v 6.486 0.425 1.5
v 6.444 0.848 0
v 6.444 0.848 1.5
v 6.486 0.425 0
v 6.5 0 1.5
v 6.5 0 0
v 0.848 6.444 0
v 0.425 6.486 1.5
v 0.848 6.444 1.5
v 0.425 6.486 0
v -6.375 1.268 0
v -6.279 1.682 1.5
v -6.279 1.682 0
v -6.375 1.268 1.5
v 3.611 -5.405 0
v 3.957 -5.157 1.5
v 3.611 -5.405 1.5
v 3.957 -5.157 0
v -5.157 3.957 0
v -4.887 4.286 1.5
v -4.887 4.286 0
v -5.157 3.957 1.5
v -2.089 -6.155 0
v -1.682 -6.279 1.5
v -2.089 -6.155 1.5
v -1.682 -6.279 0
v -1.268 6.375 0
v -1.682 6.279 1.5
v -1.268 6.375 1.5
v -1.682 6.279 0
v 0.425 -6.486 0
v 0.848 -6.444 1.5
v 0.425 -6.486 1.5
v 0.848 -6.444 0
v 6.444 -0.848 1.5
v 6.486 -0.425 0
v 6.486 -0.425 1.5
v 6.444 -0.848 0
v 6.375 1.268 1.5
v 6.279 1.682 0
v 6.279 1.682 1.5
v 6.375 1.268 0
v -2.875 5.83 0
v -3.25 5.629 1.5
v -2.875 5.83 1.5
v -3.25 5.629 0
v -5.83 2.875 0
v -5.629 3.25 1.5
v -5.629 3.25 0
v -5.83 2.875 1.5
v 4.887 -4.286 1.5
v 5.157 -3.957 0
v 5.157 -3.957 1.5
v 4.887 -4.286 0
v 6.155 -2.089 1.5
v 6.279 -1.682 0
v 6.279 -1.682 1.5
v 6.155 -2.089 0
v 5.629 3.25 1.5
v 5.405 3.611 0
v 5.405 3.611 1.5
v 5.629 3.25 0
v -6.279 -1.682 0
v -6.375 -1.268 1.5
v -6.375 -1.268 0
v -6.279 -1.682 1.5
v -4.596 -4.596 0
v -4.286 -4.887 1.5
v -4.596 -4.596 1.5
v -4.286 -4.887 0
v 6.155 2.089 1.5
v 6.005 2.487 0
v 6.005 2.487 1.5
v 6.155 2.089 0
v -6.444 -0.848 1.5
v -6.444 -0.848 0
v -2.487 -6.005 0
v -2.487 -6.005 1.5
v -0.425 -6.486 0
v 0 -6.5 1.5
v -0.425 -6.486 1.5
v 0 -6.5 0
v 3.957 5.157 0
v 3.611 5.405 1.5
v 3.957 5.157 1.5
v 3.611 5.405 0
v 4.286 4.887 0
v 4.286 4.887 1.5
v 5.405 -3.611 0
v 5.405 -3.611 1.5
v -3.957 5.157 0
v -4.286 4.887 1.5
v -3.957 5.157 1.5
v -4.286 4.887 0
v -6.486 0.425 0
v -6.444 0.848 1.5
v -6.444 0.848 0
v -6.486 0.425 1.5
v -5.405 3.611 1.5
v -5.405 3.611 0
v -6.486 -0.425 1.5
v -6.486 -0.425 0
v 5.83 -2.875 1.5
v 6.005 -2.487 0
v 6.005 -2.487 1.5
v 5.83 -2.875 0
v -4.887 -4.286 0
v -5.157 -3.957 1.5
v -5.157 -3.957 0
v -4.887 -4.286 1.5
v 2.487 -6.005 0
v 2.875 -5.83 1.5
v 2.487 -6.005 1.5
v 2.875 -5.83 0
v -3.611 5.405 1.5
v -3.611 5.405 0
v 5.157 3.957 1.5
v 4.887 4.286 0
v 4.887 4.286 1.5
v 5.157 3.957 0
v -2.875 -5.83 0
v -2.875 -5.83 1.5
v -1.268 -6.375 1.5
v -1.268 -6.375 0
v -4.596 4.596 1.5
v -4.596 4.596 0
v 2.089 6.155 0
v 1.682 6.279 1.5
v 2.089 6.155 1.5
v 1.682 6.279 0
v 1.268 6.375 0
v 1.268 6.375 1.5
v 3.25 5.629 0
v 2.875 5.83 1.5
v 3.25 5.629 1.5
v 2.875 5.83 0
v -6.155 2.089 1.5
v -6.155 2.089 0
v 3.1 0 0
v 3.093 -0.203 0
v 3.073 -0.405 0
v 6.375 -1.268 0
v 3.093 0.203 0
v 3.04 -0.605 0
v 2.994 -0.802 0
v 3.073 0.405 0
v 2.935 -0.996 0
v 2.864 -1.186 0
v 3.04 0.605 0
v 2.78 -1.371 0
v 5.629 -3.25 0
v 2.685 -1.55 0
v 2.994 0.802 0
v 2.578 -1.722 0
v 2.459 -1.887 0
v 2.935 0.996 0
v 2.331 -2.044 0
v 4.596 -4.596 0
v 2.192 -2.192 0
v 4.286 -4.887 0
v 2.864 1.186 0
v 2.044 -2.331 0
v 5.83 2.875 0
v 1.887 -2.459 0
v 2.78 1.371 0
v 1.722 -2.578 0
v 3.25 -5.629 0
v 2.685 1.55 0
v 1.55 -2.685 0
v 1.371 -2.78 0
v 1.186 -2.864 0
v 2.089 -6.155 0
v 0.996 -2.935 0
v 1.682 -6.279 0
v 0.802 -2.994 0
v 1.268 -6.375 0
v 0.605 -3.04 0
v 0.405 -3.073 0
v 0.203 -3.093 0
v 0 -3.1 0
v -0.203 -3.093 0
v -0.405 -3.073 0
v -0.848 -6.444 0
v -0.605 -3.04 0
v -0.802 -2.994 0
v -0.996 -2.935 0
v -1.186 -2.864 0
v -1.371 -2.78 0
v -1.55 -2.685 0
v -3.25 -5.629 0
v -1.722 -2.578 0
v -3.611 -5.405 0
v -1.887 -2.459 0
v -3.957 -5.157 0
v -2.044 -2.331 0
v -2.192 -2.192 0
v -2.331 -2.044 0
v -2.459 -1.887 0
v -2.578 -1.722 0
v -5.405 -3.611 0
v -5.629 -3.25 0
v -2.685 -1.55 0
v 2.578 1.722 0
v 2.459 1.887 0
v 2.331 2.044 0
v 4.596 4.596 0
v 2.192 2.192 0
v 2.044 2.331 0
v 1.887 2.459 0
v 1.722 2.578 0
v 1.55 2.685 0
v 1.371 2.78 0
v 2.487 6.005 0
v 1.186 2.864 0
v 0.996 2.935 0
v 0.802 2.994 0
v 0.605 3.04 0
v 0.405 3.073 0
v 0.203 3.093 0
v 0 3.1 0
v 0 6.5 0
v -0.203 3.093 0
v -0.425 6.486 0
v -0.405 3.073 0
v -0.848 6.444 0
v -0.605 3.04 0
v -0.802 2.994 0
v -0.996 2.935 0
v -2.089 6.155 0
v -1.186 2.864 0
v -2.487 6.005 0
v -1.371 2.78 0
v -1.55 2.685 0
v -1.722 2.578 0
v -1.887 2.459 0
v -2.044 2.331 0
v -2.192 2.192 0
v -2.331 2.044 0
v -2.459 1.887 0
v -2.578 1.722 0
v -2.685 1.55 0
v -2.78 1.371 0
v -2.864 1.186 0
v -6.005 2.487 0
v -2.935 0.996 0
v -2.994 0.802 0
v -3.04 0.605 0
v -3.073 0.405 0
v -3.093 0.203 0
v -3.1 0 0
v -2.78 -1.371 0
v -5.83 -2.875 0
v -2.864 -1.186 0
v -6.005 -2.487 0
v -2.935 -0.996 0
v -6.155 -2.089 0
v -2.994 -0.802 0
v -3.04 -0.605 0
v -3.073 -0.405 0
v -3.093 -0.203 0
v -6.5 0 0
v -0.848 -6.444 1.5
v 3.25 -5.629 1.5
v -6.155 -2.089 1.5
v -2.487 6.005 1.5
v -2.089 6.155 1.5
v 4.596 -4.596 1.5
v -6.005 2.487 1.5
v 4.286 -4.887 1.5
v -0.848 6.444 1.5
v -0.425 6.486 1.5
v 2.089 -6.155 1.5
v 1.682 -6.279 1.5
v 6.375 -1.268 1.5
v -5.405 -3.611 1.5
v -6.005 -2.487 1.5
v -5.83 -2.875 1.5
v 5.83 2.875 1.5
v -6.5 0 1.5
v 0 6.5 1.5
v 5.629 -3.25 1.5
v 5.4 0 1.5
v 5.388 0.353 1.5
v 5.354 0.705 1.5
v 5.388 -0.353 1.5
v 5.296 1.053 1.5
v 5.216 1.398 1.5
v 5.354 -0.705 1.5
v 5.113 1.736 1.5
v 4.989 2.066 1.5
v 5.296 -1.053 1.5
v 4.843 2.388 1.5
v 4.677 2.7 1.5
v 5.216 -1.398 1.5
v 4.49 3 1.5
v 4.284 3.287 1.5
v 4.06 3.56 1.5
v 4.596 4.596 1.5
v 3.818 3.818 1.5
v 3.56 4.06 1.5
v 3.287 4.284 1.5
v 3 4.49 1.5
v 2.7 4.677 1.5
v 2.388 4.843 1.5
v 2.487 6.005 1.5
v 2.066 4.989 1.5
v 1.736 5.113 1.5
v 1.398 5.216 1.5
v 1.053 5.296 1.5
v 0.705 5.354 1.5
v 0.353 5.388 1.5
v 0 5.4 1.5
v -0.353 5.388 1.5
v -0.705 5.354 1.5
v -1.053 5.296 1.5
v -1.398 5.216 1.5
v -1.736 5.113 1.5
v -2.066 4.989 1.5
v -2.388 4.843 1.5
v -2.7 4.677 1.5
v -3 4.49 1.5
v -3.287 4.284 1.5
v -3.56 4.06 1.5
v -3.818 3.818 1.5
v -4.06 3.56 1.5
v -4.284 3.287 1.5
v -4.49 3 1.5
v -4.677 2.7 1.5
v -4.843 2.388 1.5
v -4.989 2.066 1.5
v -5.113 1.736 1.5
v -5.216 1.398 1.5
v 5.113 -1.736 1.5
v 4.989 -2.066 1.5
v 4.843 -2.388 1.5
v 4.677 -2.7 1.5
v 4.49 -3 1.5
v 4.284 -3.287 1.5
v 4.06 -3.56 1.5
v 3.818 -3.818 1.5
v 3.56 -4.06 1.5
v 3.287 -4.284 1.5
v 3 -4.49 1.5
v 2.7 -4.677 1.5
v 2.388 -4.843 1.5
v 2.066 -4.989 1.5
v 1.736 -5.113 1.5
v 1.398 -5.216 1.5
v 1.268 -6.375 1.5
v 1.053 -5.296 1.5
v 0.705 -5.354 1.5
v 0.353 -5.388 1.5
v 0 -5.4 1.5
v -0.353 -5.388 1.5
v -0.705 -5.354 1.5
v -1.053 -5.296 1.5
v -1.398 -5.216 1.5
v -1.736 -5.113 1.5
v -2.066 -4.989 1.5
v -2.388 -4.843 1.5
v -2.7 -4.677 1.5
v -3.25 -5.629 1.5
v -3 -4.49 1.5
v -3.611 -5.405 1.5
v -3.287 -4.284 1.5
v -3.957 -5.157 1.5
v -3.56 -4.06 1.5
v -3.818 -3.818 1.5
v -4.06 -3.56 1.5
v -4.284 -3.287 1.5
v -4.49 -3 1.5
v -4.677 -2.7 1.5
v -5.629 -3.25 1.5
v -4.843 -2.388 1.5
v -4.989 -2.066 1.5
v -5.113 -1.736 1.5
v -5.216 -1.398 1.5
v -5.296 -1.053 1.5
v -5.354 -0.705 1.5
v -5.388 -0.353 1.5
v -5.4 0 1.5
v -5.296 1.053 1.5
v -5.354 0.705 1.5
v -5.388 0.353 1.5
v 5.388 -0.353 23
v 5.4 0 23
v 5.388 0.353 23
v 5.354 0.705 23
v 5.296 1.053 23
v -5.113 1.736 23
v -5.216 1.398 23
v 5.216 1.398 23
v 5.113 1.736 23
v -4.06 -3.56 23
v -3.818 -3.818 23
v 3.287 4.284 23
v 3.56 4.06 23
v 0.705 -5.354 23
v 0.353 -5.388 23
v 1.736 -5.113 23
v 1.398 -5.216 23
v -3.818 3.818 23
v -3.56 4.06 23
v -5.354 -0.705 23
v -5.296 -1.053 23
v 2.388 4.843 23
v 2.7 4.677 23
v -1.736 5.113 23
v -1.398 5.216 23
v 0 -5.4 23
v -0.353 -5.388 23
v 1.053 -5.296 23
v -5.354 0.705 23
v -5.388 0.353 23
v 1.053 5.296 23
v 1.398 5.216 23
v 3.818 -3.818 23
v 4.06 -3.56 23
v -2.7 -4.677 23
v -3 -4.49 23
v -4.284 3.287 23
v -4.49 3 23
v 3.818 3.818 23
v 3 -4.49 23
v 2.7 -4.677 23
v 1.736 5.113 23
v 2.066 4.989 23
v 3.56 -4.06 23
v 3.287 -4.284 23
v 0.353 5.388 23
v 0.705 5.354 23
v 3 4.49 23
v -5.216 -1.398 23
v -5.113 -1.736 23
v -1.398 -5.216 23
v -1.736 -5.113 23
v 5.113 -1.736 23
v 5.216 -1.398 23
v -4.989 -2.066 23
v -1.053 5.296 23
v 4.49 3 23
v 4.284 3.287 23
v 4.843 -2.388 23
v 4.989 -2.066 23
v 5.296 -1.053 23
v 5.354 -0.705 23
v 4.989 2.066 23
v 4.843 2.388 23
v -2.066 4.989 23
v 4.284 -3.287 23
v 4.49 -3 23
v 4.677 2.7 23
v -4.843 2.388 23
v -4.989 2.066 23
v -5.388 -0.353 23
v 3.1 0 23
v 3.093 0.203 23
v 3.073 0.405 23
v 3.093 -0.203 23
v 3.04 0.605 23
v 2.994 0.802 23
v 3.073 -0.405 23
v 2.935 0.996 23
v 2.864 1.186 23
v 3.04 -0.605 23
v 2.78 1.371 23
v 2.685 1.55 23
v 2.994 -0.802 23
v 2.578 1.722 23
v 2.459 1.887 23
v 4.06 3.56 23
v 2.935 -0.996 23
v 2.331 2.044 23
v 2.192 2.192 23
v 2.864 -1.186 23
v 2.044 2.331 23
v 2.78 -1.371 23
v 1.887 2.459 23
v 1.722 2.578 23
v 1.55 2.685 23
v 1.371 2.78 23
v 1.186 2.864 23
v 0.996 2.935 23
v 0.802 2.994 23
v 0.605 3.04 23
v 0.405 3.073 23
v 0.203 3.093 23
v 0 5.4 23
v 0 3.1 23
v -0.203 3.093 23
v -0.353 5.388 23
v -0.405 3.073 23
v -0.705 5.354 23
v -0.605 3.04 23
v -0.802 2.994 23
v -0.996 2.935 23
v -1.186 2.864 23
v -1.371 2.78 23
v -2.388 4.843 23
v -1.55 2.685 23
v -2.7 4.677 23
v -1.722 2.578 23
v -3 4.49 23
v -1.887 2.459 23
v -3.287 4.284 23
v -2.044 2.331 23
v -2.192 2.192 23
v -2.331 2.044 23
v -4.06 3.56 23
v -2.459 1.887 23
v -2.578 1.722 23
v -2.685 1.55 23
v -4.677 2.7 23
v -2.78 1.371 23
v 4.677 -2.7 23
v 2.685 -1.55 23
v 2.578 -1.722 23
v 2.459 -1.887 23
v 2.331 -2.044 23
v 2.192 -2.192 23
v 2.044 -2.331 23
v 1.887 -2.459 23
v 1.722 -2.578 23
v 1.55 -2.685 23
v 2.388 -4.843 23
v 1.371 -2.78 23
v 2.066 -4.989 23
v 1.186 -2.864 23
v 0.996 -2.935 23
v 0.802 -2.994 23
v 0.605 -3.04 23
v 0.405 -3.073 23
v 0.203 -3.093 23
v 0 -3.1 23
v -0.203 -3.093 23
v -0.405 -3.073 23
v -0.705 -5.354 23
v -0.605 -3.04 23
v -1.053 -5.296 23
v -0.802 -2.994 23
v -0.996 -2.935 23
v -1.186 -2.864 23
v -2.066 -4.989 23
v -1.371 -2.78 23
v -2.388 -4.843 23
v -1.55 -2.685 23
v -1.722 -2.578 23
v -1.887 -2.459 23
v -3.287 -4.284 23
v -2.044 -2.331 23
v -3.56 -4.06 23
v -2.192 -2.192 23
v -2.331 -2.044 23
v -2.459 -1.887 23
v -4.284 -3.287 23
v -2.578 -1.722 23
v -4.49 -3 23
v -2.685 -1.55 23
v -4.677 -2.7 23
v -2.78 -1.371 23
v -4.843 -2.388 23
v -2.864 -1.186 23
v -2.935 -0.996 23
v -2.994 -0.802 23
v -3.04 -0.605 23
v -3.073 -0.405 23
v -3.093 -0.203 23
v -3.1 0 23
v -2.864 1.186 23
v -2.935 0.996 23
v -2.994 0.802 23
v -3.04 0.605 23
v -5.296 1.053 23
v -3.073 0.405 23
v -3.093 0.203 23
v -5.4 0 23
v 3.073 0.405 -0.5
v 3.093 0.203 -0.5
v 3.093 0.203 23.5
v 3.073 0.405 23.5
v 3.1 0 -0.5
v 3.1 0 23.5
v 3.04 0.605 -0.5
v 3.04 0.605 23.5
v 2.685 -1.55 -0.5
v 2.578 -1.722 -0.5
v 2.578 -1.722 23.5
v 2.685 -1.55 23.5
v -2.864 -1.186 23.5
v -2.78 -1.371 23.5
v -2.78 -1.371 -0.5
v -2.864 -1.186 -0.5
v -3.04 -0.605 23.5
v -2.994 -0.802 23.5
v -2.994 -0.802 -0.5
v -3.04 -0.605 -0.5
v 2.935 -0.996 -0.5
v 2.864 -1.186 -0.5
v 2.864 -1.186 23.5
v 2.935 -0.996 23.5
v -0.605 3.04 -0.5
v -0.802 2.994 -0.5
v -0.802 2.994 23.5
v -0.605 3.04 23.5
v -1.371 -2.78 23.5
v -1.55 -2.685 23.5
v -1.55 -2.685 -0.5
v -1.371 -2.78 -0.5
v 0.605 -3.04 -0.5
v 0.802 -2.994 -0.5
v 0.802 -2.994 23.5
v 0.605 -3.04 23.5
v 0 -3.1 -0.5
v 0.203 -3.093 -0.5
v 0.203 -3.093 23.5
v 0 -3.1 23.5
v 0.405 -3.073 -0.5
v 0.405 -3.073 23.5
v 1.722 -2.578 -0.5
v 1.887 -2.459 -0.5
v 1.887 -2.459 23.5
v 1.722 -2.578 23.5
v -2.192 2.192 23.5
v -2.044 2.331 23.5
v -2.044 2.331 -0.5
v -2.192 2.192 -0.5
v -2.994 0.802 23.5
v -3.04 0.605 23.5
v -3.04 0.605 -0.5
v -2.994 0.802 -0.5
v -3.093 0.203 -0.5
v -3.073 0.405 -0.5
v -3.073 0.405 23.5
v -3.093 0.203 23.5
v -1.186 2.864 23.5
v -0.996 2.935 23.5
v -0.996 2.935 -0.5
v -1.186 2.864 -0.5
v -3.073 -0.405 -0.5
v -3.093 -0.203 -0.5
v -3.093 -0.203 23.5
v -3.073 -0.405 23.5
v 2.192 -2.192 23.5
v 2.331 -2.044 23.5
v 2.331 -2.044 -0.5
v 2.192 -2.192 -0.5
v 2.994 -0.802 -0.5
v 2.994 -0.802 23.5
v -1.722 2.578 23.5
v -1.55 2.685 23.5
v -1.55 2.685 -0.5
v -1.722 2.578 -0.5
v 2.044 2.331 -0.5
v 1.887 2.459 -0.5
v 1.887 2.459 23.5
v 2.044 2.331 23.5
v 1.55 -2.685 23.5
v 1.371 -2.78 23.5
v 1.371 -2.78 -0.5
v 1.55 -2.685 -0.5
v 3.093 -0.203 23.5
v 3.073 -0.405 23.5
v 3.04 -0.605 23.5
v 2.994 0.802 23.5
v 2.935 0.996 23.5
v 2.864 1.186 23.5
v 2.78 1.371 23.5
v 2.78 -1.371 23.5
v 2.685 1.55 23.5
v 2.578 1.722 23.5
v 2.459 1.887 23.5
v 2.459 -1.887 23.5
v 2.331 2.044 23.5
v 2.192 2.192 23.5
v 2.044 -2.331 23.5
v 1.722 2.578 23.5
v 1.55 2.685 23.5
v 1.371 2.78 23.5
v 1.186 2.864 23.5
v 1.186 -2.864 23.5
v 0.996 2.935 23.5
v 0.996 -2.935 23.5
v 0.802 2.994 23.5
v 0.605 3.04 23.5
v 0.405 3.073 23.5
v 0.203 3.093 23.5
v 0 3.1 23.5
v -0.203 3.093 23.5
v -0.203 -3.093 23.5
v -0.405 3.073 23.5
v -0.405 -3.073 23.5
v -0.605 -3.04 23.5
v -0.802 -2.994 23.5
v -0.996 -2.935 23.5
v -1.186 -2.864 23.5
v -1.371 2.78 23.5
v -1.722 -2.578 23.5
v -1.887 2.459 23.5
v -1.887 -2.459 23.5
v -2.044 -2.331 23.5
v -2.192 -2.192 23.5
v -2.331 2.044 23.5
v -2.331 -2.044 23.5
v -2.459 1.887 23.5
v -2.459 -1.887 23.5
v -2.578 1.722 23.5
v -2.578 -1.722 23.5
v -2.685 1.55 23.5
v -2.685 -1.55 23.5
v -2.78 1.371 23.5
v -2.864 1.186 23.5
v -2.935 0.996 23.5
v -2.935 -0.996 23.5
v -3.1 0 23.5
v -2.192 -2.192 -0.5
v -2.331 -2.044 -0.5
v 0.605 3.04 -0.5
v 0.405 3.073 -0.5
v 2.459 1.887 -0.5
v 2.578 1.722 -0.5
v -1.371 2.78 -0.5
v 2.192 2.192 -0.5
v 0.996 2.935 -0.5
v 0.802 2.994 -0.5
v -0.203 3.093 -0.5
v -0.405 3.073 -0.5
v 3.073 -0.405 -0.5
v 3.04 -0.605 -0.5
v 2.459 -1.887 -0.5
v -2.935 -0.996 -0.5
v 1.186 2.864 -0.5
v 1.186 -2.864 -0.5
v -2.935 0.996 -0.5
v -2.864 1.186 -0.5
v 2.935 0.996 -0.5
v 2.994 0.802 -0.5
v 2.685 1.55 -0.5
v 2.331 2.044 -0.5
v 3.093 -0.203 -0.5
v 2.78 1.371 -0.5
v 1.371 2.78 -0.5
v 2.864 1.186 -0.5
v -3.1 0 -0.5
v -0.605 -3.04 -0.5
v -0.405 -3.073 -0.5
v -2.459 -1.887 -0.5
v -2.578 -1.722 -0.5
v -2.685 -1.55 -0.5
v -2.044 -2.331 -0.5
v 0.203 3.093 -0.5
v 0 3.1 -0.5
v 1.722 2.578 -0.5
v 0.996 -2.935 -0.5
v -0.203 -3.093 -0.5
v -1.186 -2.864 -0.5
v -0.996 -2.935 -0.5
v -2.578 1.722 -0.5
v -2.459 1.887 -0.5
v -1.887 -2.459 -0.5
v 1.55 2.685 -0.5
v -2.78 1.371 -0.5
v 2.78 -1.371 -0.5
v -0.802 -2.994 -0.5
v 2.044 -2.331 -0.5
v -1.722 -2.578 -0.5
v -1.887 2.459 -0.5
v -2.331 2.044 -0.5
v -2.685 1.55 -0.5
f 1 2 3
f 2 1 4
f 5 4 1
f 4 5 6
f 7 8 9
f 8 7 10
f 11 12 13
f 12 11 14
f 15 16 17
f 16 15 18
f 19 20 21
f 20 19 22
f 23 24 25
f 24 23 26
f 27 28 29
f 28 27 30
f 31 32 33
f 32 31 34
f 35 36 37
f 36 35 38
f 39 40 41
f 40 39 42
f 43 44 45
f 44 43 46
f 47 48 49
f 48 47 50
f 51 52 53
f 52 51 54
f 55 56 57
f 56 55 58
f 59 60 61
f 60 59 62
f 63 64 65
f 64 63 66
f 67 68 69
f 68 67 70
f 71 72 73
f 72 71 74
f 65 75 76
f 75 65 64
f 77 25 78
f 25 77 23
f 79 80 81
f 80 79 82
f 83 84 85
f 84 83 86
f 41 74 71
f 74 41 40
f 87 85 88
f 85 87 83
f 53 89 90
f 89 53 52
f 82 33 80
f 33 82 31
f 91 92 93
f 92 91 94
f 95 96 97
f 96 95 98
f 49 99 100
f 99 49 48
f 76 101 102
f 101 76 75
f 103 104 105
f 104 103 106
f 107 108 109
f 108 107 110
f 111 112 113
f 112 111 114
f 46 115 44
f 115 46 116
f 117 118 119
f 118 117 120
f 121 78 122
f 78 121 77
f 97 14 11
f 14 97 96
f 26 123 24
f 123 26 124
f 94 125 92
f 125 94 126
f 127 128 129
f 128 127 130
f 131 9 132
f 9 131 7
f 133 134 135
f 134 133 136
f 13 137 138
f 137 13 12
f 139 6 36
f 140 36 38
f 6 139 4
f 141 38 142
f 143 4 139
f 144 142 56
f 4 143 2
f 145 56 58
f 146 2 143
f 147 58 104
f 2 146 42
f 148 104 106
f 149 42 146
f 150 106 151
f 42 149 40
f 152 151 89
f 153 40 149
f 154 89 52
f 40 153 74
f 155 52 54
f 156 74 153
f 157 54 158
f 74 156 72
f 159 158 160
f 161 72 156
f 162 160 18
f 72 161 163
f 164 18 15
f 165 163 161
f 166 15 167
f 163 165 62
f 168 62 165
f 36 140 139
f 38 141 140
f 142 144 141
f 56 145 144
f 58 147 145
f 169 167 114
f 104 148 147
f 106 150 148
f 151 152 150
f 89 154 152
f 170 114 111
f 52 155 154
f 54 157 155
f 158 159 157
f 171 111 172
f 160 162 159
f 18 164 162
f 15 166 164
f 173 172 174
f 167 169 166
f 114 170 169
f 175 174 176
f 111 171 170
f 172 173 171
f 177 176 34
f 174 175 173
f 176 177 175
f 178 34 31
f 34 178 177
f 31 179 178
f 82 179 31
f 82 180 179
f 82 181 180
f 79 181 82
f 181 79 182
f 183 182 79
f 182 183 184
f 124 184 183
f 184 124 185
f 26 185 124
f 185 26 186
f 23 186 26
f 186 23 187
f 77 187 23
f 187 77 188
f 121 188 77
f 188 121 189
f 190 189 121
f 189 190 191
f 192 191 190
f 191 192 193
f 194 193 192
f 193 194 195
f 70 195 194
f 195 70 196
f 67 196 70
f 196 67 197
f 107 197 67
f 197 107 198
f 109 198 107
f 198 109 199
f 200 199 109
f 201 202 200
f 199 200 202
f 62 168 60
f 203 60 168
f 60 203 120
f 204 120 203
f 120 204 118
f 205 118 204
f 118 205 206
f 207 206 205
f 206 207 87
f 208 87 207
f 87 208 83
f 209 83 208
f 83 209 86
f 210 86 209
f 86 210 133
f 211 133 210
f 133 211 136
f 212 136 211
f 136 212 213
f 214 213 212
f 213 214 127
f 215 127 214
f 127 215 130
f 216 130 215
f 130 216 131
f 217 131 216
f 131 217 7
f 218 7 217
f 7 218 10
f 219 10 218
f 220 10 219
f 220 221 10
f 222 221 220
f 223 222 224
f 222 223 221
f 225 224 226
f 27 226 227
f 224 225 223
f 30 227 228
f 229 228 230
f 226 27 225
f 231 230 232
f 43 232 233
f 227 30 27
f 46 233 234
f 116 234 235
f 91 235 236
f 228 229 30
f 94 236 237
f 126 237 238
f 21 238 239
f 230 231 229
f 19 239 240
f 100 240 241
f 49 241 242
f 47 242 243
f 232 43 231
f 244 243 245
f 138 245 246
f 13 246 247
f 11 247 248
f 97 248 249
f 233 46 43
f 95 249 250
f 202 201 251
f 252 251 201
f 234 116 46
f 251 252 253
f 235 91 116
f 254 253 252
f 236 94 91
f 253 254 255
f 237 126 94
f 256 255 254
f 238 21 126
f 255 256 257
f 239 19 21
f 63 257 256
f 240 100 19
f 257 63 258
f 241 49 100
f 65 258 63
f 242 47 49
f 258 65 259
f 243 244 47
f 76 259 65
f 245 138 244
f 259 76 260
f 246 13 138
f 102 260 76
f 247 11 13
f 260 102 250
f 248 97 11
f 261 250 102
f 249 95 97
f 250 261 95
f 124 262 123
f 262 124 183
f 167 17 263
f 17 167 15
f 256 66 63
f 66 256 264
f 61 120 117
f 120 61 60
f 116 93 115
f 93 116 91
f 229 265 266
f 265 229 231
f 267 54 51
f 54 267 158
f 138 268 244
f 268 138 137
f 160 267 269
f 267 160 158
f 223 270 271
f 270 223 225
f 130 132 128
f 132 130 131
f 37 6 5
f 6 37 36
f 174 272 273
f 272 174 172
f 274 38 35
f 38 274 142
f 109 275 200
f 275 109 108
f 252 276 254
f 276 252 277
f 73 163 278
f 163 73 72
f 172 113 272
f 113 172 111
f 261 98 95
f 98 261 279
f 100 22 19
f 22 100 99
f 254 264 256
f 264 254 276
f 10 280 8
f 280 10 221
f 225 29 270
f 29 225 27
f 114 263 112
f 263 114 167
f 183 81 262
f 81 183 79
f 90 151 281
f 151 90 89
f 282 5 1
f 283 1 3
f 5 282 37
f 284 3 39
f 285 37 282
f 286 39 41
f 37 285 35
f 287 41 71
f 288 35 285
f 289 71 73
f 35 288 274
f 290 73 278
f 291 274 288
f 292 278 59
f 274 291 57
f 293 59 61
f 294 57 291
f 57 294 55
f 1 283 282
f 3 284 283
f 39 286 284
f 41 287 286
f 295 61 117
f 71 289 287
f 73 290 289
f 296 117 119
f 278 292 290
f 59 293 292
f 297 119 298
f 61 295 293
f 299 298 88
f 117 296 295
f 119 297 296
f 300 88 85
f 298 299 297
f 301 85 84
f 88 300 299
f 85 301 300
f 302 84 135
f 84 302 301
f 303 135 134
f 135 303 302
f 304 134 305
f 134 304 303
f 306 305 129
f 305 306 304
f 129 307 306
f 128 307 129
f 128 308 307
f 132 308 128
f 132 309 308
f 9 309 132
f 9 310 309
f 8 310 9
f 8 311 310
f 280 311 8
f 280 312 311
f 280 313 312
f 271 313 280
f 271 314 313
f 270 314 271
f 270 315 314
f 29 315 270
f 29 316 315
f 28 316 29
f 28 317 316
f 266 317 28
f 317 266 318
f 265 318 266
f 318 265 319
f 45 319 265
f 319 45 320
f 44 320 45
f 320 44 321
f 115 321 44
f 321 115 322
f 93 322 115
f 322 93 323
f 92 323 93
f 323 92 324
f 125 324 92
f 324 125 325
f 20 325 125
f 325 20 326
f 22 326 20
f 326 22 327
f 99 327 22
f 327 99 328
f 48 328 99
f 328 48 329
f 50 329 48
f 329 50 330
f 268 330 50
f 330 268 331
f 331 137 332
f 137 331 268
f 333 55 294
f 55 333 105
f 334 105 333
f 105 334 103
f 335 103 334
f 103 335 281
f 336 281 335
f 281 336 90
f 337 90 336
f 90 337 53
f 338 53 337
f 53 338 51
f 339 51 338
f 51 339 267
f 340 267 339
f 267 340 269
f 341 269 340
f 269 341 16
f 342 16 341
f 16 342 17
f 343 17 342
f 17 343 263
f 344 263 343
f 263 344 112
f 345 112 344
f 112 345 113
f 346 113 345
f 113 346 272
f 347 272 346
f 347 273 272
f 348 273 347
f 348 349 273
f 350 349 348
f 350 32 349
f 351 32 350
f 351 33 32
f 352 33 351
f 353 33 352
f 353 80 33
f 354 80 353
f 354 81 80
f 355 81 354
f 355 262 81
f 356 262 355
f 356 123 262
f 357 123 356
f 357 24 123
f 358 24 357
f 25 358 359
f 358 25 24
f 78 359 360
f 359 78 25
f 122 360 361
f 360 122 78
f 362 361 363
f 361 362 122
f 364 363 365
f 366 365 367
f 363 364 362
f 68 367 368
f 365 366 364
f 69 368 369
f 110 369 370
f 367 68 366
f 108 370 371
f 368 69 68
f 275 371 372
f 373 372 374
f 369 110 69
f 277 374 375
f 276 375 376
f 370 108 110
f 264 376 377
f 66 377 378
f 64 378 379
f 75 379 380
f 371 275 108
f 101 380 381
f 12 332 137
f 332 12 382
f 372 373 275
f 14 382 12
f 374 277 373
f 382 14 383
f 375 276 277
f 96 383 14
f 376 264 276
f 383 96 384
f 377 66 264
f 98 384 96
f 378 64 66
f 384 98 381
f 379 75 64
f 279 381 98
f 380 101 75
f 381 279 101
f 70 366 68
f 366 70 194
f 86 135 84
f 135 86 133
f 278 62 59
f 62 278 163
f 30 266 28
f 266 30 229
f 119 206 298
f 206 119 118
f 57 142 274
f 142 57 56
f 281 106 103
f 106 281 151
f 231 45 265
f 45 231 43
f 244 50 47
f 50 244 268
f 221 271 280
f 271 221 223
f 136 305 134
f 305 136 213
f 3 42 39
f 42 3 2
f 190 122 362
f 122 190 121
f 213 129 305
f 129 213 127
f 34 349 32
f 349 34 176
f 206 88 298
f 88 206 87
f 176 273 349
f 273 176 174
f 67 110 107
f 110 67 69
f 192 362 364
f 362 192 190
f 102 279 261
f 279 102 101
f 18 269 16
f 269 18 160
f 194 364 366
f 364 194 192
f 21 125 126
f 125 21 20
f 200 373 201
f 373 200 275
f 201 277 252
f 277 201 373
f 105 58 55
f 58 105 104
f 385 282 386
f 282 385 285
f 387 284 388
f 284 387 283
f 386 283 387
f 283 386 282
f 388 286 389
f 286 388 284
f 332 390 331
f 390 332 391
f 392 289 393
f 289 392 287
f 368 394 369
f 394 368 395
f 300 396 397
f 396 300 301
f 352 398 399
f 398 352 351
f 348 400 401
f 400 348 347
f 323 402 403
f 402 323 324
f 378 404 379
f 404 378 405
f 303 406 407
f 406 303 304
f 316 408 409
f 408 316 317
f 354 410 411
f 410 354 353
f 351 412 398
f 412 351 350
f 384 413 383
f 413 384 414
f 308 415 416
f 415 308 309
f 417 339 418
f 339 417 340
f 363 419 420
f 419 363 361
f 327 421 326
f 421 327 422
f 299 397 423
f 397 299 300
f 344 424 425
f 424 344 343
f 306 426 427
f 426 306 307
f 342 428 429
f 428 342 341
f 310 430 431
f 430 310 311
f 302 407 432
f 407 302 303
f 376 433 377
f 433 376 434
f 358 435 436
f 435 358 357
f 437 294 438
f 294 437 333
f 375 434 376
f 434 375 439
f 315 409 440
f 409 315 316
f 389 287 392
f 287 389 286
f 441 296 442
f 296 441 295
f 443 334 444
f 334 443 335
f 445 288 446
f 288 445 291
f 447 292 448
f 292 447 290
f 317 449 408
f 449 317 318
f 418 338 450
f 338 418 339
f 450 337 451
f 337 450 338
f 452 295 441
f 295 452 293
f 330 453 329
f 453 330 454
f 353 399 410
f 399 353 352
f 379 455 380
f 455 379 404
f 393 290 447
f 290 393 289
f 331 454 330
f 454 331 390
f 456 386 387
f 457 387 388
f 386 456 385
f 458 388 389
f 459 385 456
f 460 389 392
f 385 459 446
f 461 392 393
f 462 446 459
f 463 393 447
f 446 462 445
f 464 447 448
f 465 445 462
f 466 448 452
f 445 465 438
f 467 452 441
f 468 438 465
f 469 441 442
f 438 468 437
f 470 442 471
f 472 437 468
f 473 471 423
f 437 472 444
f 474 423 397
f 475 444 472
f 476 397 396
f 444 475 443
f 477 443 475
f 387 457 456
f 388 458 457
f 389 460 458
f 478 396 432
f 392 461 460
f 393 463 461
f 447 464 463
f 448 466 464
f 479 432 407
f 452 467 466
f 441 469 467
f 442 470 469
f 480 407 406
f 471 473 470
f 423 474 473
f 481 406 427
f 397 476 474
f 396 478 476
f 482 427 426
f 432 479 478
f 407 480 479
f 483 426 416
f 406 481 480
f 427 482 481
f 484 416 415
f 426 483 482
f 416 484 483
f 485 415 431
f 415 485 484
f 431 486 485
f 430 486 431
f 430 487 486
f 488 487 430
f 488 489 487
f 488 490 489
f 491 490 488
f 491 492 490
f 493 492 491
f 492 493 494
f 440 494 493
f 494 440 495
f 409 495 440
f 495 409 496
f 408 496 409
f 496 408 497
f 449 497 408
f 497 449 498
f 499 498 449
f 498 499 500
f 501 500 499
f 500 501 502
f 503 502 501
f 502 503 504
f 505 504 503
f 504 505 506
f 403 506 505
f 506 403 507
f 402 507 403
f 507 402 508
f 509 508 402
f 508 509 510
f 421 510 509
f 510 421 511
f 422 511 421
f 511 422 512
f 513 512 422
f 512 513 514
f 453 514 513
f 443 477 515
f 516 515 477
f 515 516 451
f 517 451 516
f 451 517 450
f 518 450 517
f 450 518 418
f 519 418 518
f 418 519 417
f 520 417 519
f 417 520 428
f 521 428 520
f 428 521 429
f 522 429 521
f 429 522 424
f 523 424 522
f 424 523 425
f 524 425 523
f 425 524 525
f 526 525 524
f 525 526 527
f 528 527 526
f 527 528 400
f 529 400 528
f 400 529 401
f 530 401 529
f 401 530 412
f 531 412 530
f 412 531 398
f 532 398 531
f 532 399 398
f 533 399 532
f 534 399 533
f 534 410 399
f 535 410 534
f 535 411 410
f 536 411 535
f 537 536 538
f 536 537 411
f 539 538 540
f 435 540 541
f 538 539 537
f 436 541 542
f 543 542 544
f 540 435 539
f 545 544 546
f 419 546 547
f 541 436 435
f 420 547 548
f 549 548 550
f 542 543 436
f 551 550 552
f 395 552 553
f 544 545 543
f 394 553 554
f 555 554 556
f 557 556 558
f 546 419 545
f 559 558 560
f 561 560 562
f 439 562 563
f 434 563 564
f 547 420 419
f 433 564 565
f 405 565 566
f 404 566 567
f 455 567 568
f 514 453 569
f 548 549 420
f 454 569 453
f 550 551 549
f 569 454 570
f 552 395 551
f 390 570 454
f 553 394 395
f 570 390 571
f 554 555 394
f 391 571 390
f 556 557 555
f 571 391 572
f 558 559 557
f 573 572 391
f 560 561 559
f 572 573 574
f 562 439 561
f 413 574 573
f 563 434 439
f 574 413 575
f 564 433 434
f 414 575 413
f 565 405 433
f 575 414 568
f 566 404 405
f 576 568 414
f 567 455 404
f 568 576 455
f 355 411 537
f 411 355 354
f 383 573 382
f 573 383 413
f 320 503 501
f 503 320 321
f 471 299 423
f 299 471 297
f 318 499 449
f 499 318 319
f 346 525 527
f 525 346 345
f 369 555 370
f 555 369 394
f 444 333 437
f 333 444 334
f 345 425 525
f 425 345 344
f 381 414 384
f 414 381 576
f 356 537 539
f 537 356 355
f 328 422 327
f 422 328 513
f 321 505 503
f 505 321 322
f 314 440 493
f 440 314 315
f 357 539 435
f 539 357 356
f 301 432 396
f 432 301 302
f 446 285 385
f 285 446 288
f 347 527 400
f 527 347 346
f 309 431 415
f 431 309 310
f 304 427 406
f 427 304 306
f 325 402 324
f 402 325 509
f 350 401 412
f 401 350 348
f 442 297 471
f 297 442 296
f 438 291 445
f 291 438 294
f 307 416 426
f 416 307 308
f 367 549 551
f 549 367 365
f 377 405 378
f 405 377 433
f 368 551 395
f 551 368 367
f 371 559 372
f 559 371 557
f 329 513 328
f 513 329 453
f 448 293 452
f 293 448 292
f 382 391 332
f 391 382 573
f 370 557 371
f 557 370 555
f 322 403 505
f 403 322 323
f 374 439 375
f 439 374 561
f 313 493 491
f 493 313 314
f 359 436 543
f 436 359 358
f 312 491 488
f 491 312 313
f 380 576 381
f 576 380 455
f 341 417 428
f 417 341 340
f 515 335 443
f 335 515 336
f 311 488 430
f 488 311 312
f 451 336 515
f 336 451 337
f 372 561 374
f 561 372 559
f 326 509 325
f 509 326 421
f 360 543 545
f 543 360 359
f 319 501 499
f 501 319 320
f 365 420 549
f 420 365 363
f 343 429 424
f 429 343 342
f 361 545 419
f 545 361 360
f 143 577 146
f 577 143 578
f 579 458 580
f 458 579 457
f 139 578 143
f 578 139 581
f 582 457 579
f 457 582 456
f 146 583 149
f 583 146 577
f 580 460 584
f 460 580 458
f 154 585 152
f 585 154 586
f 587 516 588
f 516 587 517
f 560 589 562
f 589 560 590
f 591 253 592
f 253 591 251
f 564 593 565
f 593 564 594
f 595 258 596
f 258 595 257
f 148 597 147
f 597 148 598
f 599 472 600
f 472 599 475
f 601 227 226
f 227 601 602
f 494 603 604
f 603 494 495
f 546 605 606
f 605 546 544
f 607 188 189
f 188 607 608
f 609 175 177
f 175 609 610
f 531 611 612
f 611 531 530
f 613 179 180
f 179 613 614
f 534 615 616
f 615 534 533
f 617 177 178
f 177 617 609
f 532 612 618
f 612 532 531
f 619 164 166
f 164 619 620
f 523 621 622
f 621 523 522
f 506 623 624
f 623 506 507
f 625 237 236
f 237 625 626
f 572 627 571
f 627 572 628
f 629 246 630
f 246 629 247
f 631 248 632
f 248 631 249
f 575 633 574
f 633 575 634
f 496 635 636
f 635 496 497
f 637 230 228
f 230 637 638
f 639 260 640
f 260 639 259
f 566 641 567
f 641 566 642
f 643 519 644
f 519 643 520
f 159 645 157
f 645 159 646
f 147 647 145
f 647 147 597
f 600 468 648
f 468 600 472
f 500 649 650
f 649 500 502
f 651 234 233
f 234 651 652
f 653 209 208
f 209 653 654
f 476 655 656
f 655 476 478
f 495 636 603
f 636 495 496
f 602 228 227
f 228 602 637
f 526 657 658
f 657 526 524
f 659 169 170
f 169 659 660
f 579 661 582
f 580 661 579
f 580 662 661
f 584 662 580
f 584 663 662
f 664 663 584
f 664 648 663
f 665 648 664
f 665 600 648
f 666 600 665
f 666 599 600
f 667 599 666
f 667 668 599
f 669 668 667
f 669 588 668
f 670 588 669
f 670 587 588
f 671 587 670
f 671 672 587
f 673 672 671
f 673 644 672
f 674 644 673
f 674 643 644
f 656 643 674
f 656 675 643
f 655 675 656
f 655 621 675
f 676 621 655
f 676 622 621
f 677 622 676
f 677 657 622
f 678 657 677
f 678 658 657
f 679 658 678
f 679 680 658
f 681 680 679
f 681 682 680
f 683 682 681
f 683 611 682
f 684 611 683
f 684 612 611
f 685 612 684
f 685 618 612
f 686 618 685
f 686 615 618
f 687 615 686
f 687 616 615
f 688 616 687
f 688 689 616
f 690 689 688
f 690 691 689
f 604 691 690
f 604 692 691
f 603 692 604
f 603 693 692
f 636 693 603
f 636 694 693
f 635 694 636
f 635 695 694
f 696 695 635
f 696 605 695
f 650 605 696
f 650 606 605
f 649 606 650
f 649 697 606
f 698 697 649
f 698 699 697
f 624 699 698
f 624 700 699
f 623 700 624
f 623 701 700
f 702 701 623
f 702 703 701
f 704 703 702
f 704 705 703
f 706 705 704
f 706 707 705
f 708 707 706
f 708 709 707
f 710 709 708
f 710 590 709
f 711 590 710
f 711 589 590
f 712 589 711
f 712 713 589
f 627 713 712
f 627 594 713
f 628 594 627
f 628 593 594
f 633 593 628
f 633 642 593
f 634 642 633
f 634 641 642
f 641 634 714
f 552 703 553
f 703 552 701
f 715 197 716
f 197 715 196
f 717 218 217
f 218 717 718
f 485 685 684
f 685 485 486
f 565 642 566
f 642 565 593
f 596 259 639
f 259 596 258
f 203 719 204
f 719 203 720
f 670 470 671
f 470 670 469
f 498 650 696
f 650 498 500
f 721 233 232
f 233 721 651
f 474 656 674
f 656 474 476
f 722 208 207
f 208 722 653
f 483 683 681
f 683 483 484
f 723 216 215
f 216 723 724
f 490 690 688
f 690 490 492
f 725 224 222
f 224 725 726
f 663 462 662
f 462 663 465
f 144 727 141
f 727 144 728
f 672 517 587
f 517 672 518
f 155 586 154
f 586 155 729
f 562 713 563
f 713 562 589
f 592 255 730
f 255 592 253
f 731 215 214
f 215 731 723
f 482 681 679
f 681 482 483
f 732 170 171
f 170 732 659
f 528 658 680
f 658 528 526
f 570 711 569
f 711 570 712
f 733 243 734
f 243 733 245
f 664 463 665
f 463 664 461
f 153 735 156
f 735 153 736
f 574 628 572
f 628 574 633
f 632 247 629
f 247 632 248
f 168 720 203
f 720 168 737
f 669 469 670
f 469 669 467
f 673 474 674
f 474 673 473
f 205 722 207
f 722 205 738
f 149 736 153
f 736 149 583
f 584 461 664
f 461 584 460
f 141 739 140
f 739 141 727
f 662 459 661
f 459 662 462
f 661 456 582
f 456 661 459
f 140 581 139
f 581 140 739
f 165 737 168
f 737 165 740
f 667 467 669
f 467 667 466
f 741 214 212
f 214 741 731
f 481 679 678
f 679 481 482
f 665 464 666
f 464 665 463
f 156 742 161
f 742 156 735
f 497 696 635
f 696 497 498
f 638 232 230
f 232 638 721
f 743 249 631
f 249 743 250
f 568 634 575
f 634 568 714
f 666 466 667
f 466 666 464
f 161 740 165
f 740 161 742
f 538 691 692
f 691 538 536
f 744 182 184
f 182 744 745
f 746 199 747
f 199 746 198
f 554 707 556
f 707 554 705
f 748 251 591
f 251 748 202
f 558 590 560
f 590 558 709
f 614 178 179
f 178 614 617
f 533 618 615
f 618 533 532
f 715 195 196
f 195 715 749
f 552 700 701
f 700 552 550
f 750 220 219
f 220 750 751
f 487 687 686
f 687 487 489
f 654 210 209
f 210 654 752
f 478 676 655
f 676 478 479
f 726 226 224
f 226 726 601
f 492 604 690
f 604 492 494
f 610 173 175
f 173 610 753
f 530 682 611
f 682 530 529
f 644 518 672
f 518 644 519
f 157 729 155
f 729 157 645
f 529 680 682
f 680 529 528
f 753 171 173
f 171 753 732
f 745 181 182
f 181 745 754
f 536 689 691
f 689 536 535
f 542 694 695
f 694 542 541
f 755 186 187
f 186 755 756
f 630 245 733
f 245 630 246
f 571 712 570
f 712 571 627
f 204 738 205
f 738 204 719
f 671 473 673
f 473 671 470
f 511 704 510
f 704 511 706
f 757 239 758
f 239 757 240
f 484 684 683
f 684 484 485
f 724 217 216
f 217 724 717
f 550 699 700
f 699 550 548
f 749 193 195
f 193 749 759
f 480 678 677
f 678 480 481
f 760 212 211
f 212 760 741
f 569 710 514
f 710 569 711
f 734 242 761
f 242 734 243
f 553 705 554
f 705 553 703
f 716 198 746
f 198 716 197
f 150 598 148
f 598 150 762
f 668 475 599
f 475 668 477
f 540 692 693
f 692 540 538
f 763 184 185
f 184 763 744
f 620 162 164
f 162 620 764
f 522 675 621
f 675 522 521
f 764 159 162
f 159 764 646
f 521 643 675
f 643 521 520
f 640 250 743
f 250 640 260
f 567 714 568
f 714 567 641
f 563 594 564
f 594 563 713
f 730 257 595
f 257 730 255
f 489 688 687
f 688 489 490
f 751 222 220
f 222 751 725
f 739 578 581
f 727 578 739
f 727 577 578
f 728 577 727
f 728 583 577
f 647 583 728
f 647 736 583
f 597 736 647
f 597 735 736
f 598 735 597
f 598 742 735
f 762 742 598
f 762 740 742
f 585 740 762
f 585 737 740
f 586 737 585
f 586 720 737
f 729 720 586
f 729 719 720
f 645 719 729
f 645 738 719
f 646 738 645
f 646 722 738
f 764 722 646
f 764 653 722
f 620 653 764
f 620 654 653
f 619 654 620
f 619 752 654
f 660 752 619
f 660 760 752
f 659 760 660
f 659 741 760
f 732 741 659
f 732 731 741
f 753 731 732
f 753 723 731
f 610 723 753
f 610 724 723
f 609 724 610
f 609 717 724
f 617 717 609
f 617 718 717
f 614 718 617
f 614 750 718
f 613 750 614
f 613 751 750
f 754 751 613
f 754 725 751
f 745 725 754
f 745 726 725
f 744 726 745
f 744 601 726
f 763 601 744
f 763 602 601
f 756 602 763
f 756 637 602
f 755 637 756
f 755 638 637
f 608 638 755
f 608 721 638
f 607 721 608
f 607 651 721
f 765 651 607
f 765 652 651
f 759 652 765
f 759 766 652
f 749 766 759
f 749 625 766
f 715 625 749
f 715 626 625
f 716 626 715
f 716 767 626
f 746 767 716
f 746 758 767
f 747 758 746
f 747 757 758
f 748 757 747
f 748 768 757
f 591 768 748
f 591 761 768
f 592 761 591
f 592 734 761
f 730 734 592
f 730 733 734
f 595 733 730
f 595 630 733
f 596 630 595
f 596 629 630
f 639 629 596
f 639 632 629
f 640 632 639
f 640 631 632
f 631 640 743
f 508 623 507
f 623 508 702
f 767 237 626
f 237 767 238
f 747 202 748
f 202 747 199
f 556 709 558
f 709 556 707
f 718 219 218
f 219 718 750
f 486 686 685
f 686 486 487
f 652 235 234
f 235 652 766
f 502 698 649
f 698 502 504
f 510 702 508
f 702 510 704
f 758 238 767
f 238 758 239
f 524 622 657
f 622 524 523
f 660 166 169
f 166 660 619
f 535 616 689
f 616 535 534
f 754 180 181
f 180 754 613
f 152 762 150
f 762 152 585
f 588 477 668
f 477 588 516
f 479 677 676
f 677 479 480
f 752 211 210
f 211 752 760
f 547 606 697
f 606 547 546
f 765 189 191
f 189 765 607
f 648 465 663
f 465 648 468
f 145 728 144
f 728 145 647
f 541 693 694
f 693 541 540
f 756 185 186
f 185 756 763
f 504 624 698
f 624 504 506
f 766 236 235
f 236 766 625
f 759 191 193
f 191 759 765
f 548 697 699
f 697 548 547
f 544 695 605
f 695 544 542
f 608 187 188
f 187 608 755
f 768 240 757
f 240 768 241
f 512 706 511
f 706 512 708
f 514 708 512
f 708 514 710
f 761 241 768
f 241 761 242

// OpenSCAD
// PCR tube adapter sleeve: fits a 0.2 mL tube into a 1.5 mL rack hole
// Print orientation: collar on the bed (z = 0), sleeve body builds upward

// ---------- Parameters ----------
collar_d        = 13;     // collar outer diameter
collar_t        = 1.5;    // collar thickness (z = 0 to 1.5)
sleeve_d        = 10.8;   // sleeve body outer diameter
sleeve_h        = 21.5;   // sleeve body height above collar (z = 1.5 to 23.0)
bore_d          = 6.2;    // through-bore diameter
eps             = 0.5;    // cutter overshoot past faces
$fn             = 96;     // curve resolution

// ---------- Model ----------
union() {
    // Collar lying on the bed
    cylinder(d = collar_d, h = collar_t);

    // Sleeve body rising from the collar top
    translate([0, 0, collar_t])
        cylinder(d = sleeve_d, h = sleeve_h);
}

// Full-height bore, open at both ends
translate([0, 0, -eps])
    cylinder(d = bore_d, h = sleeve_h + collar_t + 2 * eps);
